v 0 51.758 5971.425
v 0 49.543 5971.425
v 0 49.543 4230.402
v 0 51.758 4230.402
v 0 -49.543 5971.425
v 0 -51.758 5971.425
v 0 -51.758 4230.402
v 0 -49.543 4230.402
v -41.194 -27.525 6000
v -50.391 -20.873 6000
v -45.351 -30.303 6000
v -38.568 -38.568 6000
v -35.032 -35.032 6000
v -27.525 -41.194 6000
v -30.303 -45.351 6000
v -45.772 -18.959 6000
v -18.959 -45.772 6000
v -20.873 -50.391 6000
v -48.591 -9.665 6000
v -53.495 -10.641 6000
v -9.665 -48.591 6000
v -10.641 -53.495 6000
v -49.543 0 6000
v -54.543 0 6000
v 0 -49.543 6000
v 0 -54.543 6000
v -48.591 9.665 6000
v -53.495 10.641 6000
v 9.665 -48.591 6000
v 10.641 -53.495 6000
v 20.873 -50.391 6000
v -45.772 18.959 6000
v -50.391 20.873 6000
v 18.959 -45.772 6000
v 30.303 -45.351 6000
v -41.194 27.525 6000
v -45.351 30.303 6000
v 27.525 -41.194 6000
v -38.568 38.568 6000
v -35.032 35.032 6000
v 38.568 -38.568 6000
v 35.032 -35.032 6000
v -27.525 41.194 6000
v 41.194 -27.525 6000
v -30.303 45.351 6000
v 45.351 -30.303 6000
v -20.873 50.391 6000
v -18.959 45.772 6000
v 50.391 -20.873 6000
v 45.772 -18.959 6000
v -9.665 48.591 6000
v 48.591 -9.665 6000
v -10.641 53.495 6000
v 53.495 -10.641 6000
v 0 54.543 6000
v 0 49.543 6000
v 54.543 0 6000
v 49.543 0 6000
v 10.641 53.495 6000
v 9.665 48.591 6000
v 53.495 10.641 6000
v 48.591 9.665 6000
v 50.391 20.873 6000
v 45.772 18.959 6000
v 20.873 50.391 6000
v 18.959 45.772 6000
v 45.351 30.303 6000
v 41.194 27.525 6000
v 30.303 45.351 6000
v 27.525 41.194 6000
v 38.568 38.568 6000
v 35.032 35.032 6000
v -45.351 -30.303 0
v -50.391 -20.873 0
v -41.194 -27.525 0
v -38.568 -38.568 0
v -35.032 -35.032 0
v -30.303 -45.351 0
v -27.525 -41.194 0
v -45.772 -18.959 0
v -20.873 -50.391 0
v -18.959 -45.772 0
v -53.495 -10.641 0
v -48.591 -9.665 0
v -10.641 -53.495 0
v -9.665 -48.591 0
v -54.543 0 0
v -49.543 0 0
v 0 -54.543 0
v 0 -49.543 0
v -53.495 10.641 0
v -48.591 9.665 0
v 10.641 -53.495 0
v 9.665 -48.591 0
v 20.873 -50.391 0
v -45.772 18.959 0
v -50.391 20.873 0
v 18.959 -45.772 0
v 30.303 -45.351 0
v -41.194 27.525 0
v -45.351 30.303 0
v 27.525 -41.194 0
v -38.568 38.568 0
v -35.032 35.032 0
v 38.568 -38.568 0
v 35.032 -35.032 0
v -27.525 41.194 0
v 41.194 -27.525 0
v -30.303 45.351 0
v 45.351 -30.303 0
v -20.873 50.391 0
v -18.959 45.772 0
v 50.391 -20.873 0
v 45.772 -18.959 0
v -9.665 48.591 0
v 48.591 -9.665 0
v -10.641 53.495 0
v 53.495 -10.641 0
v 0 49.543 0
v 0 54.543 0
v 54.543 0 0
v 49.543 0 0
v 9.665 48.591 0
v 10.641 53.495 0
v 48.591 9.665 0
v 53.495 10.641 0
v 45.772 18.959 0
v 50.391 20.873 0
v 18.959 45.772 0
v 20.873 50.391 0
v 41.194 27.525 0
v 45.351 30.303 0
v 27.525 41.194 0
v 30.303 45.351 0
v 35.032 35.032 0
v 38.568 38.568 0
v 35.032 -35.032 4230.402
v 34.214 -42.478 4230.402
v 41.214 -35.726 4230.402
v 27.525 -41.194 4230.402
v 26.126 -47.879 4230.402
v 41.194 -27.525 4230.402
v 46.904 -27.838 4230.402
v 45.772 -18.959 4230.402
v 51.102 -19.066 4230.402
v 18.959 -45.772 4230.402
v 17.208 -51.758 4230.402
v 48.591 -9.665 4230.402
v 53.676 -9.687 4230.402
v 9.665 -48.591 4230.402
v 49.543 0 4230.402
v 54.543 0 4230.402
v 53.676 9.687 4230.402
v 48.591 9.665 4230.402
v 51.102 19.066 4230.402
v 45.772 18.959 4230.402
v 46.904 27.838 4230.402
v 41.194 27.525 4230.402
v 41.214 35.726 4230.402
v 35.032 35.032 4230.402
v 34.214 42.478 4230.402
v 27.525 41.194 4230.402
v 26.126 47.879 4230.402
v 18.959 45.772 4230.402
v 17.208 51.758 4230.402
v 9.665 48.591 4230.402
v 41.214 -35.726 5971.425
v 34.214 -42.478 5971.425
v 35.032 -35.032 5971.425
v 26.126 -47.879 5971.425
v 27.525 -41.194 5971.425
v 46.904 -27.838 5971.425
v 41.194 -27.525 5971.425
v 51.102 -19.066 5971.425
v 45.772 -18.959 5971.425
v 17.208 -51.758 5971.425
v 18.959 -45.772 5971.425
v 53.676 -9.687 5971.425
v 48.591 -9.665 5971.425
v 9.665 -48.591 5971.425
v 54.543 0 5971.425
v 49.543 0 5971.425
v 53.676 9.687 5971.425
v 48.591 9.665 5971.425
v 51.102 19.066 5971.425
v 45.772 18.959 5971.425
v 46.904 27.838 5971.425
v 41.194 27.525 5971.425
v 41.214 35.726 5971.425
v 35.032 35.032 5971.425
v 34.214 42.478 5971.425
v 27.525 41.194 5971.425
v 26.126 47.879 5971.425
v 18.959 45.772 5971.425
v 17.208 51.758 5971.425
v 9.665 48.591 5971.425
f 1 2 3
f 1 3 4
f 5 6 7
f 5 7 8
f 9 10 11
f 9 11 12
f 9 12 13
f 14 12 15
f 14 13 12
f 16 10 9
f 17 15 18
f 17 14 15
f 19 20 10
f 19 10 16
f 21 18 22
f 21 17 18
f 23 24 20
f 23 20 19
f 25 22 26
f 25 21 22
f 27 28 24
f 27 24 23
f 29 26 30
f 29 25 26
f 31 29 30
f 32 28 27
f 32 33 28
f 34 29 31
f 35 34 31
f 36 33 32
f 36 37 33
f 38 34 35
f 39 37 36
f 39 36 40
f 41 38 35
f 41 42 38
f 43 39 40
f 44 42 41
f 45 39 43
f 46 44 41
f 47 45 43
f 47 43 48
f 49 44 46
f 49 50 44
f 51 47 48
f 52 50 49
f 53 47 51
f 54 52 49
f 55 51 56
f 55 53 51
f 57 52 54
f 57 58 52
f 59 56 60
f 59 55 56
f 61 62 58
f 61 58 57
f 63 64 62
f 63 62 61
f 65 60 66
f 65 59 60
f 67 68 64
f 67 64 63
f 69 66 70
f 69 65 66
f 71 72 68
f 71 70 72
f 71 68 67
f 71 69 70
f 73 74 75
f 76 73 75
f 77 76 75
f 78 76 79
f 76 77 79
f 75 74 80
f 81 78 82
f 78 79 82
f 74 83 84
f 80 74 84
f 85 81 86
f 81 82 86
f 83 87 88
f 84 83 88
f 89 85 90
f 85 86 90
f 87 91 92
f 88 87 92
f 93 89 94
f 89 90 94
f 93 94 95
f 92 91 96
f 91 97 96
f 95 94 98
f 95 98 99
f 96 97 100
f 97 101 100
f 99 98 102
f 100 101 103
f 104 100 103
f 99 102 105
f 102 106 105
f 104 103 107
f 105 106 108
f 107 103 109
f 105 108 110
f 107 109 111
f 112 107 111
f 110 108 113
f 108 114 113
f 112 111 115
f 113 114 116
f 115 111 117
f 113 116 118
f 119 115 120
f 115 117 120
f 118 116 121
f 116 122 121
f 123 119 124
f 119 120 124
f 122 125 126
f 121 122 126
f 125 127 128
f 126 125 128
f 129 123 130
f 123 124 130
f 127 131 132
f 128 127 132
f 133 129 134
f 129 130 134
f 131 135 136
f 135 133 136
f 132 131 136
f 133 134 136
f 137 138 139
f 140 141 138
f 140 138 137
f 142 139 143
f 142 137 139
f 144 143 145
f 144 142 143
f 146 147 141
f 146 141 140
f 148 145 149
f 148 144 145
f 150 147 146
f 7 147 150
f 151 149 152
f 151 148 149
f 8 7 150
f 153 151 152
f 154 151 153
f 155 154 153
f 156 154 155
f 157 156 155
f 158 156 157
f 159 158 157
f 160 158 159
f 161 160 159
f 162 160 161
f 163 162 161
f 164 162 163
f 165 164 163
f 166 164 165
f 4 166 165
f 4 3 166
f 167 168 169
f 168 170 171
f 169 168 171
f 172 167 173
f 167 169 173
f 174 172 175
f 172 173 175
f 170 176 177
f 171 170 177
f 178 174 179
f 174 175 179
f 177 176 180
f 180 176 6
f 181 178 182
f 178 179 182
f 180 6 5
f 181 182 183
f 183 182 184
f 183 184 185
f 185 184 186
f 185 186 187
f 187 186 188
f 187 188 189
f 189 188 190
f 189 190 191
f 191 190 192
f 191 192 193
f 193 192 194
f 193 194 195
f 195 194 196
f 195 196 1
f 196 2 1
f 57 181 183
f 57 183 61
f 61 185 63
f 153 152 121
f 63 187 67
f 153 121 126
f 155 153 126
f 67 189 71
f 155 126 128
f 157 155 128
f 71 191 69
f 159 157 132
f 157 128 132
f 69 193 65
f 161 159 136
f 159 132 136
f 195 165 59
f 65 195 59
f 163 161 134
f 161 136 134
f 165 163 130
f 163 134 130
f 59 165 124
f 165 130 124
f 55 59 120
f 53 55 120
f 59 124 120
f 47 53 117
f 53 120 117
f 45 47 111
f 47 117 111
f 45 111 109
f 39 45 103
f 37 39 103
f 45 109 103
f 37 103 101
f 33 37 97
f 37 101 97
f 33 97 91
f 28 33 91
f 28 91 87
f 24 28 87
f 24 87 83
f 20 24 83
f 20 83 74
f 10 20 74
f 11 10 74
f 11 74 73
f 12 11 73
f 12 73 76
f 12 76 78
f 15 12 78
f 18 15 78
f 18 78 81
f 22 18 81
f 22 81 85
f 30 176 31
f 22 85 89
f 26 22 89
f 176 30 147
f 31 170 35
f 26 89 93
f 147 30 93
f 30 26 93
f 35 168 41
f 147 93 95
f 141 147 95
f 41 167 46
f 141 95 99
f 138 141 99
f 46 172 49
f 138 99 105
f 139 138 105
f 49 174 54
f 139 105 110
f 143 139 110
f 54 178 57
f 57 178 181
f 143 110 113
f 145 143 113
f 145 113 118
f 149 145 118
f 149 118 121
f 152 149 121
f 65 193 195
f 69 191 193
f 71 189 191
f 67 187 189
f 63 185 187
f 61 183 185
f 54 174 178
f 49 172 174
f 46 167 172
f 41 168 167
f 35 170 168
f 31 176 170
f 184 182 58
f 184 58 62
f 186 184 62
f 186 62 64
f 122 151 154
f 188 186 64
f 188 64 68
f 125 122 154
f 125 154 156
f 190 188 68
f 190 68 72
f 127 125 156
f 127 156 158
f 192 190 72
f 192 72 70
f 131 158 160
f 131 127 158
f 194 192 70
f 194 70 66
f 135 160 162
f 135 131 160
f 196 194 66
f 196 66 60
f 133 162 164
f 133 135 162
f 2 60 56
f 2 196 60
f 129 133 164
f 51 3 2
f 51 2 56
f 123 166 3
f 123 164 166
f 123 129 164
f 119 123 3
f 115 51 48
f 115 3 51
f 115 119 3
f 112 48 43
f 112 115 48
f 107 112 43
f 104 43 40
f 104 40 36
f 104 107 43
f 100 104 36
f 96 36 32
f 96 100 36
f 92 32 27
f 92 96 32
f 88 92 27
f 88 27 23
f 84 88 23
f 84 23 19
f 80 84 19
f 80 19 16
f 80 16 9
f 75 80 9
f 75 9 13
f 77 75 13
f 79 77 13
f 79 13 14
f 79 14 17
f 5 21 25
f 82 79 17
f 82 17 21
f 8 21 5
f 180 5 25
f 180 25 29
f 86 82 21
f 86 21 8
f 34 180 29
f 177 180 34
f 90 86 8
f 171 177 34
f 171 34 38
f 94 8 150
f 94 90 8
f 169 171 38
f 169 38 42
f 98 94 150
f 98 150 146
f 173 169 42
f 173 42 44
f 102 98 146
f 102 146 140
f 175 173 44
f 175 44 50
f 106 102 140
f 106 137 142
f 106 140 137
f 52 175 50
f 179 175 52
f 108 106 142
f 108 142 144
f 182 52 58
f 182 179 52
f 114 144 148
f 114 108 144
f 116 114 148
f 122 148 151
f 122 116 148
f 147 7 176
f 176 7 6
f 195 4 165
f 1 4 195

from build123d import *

# Parameters (mm, degrees)
F0_R     = 54.543223
F1_DEPTH = 6000
F2_T     = -5
F3_W     = 103.515356
F3_H     = 1741.023063
F4_DEPTH = 772.16


with BuildPart() as f1:
    # F0 (on Top) → F1 (new body)
    with BuildSketch(Plane.XY):
        Circle(F0_R)
    extrude(amount=F1_DEPTH)

    # F2
    f2_openings = [f1.faces().sort_by_distance(p)[0] for p in [
        (0, 0, 6000),
        (0, 0, 0),
    ]]
    offset(amount=F2_T, openings=f2_openings)

    # F3 (on Right) → F4 (cut)
    with BuildSketch(Plane.YZ):
        with Locations((0, 5100.913524)):
            Rectangle(F3_W, F3_H)
    extrude(amount=F4_DEPTH, mode=Mode.SUBTRACT)


solid = f1.part
